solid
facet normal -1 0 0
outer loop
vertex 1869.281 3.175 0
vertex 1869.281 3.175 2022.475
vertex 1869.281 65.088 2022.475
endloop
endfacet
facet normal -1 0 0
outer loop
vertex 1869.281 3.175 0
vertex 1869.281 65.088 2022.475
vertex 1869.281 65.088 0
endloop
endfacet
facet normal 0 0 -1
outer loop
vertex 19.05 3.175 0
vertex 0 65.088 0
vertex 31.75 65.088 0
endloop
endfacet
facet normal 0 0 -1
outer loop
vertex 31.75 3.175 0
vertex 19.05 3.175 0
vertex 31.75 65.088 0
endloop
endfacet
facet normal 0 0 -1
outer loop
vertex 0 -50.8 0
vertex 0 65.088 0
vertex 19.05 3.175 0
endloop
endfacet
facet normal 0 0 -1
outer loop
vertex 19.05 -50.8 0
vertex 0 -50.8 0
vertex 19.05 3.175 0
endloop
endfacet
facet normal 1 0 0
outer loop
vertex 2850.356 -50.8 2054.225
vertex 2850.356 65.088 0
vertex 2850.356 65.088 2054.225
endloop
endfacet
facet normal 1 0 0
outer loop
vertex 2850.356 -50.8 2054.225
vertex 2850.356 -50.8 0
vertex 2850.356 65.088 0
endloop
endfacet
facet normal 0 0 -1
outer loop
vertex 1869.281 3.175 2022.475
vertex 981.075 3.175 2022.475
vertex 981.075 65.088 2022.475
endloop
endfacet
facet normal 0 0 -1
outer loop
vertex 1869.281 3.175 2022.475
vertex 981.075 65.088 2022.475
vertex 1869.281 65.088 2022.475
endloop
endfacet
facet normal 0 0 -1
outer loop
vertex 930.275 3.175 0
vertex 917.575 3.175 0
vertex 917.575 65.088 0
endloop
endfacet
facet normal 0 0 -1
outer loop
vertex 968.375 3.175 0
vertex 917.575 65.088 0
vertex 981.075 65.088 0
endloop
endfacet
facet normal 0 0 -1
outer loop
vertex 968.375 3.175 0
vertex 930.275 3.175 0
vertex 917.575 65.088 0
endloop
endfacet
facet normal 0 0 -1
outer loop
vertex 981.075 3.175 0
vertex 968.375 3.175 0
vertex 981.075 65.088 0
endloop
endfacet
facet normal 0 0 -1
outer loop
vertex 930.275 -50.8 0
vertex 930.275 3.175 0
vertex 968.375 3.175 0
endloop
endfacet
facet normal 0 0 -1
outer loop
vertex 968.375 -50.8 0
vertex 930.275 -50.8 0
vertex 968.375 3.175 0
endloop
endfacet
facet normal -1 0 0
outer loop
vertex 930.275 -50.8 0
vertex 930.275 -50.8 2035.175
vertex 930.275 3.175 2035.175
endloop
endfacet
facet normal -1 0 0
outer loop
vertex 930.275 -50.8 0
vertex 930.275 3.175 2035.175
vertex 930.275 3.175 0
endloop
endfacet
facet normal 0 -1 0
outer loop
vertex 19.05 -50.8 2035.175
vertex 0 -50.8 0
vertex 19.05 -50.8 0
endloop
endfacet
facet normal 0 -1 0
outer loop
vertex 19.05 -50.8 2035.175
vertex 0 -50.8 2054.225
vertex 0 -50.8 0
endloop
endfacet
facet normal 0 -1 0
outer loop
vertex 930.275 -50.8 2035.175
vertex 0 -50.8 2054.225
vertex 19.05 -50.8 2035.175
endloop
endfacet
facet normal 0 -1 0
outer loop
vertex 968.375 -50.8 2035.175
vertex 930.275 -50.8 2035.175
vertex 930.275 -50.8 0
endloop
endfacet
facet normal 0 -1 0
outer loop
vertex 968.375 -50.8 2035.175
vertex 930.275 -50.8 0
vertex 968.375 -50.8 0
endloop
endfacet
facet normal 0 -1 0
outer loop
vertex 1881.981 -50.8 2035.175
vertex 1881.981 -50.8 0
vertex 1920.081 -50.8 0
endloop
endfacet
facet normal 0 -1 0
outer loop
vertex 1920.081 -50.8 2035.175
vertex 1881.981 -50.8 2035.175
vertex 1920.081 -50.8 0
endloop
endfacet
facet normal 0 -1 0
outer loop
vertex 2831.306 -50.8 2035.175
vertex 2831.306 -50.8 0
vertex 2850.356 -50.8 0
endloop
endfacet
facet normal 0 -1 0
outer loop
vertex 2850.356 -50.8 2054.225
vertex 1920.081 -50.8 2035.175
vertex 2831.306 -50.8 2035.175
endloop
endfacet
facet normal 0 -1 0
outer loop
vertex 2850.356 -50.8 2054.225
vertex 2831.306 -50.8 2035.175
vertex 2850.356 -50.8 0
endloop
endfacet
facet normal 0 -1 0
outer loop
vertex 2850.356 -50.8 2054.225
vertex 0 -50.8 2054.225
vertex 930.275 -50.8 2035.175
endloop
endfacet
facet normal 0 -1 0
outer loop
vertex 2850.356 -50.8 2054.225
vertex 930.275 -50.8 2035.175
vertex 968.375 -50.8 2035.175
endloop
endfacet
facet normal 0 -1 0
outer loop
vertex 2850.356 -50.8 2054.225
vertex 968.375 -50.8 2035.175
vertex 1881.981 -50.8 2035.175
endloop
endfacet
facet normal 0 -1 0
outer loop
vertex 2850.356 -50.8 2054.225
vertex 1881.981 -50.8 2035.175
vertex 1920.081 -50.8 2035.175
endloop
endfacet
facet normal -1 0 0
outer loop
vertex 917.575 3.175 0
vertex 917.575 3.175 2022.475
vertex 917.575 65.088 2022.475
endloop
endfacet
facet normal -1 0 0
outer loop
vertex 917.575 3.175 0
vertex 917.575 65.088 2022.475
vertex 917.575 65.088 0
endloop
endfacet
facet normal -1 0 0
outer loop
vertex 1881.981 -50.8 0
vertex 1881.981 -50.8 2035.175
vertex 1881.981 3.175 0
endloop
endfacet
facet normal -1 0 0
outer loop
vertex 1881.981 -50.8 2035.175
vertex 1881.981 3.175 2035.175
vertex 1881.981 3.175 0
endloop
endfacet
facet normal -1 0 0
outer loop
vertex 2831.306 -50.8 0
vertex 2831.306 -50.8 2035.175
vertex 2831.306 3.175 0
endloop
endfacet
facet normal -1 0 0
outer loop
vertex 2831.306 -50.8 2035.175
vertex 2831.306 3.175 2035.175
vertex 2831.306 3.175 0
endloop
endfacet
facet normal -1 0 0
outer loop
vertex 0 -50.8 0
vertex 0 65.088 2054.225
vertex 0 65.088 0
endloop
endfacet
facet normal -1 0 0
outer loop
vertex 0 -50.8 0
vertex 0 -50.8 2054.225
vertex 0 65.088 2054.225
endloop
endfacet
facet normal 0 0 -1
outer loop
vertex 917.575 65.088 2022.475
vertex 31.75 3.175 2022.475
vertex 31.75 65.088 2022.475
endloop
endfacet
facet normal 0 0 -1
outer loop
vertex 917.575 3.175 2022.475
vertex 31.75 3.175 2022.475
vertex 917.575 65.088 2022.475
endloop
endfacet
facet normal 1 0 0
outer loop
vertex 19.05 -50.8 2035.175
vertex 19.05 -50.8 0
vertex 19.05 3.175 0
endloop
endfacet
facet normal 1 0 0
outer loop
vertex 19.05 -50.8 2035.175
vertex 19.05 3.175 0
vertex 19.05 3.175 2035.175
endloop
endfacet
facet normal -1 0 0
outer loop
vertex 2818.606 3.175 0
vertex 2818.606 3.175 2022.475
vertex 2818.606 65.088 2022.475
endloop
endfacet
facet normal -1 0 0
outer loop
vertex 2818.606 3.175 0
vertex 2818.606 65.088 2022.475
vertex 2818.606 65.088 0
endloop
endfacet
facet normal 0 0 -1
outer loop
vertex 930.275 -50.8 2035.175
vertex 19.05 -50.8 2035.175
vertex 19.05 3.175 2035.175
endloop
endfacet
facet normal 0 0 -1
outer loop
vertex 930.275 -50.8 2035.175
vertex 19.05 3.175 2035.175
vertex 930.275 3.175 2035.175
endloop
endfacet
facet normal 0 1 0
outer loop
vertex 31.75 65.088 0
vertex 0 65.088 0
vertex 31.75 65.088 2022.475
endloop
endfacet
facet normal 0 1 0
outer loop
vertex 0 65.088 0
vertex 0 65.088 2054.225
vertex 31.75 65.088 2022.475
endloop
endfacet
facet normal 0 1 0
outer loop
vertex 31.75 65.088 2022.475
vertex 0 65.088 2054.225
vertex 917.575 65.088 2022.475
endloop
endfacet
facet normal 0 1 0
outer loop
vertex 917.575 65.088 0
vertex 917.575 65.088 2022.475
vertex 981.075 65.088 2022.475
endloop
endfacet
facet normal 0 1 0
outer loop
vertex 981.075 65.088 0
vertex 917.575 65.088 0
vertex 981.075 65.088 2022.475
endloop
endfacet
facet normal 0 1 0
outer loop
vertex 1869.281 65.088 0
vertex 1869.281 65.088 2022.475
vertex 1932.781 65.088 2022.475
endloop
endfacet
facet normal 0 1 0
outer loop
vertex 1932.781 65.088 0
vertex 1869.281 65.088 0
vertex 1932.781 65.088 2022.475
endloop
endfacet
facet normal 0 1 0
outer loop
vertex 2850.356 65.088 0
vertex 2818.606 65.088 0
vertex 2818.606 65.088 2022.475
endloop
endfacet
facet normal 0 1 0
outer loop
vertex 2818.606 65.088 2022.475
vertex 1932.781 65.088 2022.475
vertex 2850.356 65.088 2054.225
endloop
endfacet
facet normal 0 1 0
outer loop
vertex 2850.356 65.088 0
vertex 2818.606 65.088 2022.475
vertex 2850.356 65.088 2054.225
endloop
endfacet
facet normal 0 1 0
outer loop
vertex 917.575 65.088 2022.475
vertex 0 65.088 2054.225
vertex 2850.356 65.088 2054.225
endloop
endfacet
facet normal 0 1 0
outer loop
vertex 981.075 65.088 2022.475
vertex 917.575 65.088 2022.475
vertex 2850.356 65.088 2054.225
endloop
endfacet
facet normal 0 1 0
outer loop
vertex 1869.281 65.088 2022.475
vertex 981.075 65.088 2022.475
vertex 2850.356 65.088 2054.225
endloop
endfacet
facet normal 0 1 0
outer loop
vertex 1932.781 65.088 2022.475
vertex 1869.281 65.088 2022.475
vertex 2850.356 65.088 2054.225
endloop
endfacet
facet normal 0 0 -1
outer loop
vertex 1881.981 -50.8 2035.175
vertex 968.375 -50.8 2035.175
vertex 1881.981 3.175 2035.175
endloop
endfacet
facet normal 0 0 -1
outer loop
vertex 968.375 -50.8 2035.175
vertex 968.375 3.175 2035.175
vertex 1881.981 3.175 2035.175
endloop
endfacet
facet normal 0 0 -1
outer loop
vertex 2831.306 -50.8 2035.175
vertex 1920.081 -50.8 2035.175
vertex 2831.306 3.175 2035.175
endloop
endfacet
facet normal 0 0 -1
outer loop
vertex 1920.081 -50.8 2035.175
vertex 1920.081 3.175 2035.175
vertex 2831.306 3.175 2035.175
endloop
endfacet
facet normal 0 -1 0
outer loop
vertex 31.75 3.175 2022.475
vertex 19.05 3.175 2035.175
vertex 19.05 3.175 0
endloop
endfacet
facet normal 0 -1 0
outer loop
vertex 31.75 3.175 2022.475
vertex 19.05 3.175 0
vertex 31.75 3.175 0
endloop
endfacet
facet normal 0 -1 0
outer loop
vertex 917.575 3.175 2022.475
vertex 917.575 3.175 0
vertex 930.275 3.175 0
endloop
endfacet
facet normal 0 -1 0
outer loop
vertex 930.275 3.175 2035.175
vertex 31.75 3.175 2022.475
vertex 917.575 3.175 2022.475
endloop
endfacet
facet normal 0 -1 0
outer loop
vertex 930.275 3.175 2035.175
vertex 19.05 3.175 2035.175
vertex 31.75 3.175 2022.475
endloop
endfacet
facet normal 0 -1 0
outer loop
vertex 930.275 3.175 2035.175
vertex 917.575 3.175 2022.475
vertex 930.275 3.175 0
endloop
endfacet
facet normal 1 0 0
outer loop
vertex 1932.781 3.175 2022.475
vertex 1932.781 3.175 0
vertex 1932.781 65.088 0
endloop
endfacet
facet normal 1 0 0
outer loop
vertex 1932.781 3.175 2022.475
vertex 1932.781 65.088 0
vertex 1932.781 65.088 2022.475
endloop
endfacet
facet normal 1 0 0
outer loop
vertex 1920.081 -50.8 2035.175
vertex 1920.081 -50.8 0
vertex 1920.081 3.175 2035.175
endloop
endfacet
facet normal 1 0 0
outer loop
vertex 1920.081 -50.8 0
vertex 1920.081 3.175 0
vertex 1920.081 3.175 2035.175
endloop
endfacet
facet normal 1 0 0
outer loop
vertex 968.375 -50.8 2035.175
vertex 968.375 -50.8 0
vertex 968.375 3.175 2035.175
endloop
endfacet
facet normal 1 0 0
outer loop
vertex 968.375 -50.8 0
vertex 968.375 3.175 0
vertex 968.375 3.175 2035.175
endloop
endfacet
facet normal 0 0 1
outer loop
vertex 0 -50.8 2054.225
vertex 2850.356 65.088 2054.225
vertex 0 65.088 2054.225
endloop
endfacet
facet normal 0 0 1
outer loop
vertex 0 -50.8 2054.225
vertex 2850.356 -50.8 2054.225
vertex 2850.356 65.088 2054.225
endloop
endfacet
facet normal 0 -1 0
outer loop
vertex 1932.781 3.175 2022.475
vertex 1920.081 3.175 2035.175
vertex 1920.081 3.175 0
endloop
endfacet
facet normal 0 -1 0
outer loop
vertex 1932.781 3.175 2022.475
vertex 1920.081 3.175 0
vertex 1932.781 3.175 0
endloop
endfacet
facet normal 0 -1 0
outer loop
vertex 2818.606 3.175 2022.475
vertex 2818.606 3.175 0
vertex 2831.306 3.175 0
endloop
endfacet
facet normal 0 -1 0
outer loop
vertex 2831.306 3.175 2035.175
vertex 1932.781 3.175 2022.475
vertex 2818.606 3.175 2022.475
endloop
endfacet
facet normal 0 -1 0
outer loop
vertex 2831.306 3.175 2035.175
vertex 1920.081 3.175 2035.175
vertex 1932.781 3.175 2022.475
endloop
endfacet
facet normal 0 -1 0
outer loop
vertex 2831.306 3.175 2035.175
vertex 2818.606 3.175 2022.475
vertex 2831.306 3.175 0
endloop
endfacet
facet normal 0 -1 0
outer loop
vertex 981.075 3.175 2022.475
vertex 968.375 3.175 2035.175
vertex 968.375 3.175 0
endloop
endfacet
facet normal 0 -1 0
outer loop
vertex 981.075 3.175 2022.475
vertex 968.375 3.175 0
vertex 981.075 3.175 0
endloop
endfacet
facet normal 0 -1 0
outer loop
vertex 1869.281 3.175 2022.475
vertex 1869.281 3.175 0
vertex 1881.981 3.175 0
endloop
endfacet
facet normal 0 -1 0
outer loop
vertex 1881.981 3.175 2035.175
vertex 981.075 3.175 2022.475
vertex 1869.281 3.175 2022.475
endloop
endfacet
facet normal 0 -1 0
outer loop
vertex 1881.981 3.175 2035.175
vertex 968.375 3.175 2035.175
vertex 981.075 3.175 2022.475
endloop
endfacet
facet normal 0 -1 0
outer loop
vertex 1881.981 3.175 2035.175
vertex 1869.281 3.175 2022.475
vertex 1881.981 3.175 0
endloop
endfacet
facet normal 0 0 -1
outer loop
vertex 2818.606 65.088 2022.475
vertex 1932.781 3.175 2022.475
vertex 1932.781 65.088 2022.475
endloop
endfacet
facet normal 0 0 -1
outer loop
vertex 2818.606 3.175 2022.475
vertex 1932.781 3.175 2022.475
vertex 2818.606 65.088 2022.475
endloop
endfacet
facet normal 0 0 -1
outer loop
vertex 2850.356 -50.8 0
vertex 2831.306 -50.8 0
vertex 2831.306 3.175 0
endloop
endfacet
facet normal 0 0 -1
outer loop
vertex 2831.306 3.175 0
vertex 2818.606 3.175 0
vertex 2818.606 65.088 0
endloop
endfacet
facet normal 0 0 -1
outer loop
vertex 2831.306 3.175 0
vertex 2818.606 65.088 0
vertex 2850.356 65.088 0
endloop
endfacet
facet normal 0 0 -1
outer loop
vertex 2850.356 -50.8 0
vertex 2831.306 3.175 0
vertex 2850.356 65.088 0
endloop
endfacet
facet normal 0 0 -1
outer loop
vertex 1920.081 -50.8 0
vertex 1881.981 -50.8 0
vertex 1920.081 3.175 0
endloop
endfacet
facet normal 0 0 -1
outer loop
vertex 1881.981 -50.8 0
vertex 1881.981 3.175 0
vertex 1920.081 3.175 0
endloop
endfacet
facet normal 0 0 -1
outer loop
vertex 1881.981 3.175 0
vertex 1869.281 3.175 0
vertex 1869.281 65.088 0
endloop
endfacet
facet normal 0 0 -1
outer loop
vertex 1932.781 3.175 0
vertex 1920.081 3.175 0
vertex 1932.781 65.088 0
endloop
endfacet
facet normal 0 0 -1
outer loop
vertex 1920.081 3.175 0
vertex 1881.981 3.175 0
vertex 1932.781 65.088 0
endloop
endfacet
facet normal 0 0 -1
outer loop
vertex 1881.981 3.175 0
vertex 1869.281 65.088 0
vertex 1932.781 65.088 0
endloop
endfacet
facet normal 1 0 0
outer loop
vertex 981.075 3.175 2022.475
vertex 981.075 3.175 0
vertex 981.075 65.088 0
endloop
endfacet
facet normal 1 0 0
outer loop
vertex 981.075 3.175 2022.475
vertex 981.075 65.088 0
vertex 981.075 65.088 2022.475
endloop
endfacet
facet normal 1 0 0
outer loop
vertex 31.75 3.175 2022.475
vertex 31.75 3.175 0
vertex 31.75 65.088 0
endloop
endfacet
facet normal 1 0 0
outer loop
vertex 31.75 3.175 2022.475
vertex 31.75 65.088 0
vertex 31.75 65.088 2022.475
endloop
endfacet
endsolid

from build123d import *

# Parameters (mm, degrees)
F3_DEPTH      = 61.9125
F5_DEPTH      = 50.8
F5_DEPTH_BACK = 3.175


with BuildPart() as f3:
    # F2 (on offset) → F3 (new body)
    with BuildSketch(Plane.XZ.offset(-3.175)):
        Polygon((0, 2035.175), (0, 0), (19.05, 0), (31.75, 0), (31.75, 2022.475), (917.575, 2022.475), (917.575, 0), (930.275, 0), (949.325, 0), (968.375, 0), (981.075, 0), (981.075, 2022.475), (1869.28125, 2022.475), (1869.28125, 0), (1881.98125, 0), (1901.03125, 0), (1920.08125, 0), (1932.78125, 0), (1932.78125, 2022.475), (2818.60625, 2022.475), (2818.60625, 0), (2831.30625, 0), (2850.35625, 0), (2850.35625, 2035.175), (2850.35625, 2054.225), (0, 2054.225), align=None)
    extrude(amount=-F3_DEPTH)

    # F4 (on Front) → F5 (join, two sides)
    with BuildSketch(Plane.XZ) as f5_sk:
        Polygon((0, 2035.175), (0, 0), (19.05, 0), (19.05, 2022.475), (19.05, 2035.175), (930.275, 2035.175), (930.275, 0), (949.325, 0), (968.375, 0), (968.375, 2035.175), (1881.98125, 2035.175), (1881.98125, 2022.475), (1881.98125, 0), (1901.03125, 0), (1920.08125, 0), (1920.08125, 2022.475), (1920.08125, 2035.175), (2831.30625, 2035.175), (2831.30625, 2022.475), (2831.30625, 0), (2850.35625, 0), (2850.35625, 2035.175), (2850.35625, 2054.225), (0, 2054.225), align=None)
    extrude(amount=F5_DEPTH)
    extrude(f5_sk.sketch, amount=-F5_DEPTH_BACK)


solid = f3.part
